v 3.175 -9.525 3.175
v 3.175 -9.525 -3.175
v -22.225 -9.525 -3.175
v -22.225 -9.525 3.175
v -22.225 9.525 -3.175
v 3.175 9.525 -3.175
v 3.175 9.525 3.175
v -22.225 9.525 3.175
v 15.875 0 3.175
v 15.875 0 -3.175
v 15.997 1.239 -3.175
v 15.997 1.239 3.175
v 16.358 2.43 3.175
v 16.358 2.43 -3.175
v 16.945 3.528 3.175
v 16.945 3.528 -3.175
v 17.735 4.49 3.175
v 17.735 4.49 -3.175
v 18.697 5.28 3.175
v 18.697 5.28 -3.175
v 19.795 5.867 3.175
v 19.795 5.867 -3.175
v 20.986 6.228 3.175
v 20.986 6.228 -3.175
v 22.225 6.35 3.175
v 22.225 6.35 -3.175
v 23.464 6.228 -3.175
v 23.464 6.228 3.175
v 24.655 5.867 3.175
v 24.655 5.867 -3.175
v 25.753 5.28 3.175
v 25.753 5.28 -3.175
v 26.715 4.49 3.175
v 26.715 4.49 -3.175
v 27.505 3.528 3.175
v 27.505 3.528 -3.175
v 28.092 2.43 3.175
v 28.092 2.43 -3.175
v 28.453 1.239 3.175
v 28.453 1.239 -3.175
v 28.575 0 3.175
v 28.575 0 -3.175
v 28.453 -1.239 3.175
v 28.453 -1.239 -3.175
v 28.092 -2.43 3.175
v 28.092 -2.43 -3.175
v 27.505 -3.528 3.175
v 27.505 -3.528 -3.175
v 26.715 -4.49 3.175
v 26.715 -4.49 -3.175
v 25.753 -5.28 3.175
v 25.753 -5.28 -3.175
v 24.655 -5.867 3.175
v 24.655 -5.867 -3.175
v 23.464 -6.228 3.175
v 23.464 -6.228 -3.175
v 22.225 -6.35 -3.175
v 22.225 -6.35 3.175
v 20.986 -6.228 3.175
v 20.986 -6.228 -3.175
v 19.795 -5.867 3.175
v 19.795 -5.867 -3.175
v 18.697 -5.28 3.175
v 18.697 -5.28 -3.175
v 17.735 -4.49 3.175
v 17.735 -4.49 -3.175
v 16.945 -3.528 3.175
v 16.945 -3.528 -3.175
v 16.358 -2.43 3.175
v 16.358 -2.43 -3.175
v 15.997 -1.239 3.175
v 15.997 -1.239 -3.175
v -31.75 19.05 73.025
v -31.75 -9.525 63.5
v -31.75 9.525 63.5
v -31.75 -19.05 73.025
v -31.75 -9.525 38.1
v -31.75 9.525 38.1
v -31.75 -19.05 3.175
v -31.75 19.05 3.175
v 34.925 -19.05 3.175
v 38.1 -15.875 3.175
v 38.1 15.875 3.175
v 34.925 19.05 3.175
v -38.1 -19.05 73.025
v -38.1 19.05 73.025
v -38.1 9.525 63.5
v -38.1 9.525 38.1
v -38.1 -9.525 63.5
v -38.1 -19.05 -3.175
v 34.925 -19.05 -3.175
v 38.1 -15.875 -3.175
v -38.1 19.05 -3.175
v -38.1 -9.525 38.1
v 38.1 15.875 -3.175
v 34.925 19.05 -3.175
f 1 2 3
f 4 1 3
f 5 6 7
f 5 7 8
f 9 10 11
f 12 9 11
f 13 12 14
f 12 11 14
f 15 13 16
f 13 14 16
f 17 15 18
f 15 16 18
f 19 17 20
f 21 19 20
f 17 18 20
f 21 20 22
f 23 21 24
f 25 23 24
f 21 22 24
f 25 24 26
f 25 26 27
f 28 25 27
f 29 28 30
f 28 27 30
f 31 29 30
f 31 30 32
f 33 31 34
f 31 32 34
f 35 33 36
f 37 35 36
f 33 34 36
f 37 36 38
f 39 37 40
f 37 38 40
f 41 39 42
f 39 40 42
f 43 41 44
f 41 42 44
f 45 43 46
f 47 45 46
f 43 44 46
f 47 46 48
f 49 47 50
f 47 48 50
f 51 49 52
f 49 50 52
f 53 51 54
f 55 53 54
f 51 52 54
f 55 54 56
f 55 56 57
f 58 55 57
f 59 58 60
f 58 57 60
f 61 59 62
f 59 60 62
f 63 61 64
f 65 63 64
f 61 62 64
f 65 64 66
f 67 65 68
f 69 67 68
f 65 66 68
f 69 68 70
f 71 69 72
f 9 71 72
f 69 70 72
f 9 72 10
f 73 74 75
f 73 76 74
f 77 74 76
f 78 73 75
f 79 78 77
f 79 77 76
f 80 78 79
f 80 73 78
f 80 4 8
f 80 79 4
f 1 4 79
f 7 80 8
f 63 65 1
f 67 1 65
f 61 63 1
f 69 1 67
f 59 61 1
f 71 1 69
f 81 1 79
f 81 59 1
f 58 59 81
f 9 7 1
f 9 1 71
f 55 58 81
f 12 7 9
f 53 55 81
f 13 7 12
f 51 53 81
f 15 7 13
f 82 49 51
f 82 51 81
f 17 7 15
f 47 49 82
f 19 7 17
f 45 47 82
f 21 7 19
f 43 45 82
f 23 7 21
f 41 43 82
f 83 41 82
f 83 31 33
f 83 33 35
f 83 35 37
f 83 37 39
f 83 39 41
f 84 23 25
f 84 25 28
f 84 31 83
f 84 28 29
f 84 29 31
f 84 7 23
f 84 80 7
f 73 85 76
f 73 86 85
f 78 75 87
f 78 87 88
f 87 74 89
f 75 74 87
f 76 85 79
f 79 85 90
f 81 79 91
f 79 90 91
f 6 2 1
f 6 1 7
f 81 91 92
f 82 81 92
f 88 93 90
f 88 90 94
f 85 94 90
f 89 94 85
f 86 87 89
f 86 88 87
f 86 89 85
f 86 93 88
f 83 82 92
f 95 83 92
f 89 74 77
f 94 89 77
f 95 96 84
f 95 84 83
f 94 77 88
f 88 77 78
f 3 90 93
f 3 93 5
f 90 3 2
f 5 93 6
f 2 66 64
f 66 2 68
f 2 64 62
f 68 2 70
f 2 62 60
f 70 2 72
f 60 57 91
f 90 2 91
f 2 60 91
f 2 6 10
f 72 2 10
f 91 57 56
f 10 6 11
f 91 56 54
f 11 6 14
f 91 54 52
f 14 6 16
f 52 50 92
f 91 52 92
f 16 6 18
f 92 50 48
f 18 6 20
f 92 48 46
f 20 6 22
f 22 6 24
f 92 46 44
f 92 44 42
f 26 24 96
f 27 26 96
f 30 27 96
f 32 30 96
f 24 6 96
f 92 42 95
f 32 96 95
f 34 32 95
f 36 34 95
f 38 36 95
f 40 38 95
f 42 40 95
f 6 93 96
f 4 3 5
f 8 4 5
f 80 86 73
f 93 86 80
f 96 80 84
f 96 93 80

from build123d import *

# Parameters (mm, degrees)
SKETCH1_W           = 6.35
SKETCH1_H           = 69.85
SKETCH1_W_2         = 76.2
SKETCH1_H_2         = 6.35
BOSS_EXTRUDE1_DEPTH = 19.05
SKETCH2_R           = 6.35
CUT_EXTRUDE1_DEPTH  = 6.35
SKETCH3_W           = 25.4
SKETCH3_H           = 19.05
CUT_EXTRUDE2_DEPTH  = 6.35
CUT_EXTRUDE3_DEPTH  = 6.35
SKETCH5_W           = 25.4
SKETCH5_H           = 19.05
CUT_EXTRUDE4_DEPTH  = 6.35


with BuildPart() as part:
    # Sketch1 → Boss-Extrude1 (new, symmetric)
    with BuildSketch(Plane(origin=(0, 0, 0), x_dir=(1, 0, 0), z_dir=(0, 1, 0))):
        with Locations((-34.925, -38.1)):
            Rectangle(SKETCH1_W, SKETCH1_H)
        Rectangle(SKETCH1_W_2, SKETCH1_H_2)
    extrude(amount=BOSS_EXTRUDE1_DEPTH, both=True)

    # Sketch2 → Cut-Extrude1 (cut)
    with BuildSketch(Plane(origin=(0, 0, -3.175), x_dir=(-1, 0, 0), z_dir=(0, 0, -1))):
        with Locations((-22.225, 0)):
            Circle(SKETCH2_R)
    extrude(amount=-CUT_EXTRUDE1_DEPTH, mode=Mode.SUBTRACT)

    # Sketch3 → Cut-Extrude2 (cut)
    with BuildSketch(Plane(origin=(0, 0, -3.175), x_dir=(-1, 0, 0), z_dir=(0, 0, -1))):
        with Locations((9.525, 0)):
            Rectangle(SKETCH3_W, SKETCH3_H)
    extrude(amount=-CUT_EXTRUDE2_DEPTH, mode=Mode.SUBTRACT)

    # Sketch4 → Cut-Extrude3 (cut)
    with BuildSketch(Plane(origin=(0, 0, -3.175), x_dir=(-1, 0, 0), z_dir=(0, 0, -1))):
        Polygon((-34.925, 19.05), (-38.1, 15.875), (-38.1, 19.05), align=None)
        Polygon((-34.925, -19.05), (-38.1, -15.875), (-38.1, -19.05), align=None)
    extrude(amount=-CUT_EXTRUDE3_DEPTH, mode=Mode.SUBTRACT)

    # Sketch5 → Cut-Extrude4 (cut)
    with BuildSketch(Plane(origin=(-31.75, 0, 0), x_dir=(0, 0, -1), z_dir=(1, 0, 0))):
        with Locations((-50.8, 0)):
            Rectangle(SKETCH5_W, SKETCH5_H)
    extrude(amount=-CUT_EXTRUDE4_DEPTH, mode=Mode.SUBTRACT)


solid = part.part
